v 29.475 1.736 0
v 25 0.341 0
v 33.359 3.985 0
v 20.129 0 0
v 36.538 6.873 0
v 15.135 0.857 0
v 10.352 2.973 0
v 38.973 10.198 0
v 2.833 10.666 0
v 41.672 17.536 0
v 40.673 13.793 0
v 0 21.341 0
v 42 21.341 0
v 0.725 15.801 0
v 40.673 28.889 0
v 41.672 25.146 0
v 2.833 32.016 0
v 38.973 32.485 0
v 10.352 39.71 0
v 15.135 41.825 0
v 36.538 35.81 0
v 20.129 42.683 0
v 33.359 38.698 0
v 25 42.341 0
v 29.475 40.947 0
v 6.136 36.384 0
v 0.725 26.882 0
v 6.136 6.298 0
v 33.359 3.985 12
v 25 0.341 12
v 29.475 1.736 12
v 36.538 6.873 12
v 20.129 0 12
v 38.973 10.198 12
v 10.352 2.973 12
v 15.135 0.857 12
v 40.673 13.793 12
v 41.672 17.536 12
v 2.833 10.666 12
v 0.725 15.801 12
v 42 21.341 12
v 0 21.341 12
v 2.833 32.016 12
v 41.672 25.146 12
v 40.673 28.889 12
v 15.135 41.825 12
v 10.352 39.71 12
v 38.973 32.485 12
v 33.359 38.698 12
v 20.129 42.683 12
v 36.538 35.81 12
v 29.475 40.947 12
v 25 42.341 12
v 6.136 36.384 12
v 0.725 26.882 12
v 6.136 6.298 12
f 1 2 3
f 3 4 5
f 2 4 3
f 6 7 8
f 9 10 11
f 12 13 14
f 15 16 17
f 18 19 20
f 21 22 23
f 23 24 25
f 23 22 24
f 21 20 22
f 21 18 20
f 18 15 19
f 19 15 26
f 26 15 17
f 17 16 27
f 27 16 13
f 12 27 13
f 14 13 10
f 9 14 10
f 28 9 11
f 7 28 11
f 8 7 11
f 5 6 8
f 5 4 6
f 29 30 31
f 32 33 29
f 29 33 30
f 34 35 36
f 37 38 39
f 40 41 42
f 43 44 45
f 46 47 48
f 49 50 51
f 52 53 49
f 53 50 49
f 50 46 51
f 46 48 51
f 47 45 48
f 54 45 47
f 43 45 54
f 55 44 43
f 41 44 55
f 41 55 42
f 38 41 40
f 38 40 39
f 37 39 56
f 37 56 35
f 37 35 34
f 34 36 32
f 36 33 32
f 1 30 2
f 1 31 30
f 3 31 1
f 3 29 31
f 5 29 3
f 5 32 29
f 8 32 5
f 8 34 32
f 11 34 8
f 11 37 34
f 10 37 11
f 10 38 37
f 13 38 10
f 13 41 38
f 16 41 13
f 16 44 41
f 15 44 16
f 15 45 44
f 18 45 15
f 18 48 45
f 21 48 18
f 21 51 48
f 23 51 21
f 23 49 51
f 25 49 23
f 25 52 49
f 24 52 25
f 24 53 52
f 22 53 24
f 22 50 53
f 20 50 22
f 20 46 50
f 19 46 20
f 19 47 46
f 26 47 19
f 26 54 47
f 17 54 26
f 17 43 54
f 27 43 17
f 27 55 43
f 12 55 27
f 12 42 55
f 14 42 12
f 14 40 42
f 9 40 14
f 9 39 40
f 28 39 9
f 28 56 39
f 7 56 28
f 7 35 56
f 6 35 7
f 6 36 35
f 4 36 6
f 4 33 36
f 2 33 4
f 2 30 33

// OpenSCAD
$fn = 32;

// ----------------------------------------------------------------------
// Cam disc: base radius 17.0 mm, lift 8.0 mm, 28 profile points
// ----------------------------------------------------------------------

// --- parameters (mm) ---
profile_height = 12;      // extrusion height
profile_points = 28;      // points of the closed outline

profile = [[42, 21.341], [41.672, 25.146], [40.673, 28.889], [38.973, 32.485], [36.538, 35.81], [33.359, 38.698], [29.475, 40.947], [25, 42.341], [20.129, 42.683], [15.135, 41.825], [10.352, 39.71], [6.136, 36.384], [2.833, 32.016], [0.725, 26.882], [0, 21.341], [0.725, 15.801], [2.833, 10.666], [6.136, 6.298], [10.352, 2.973], [15.135, 0.857], [20.129, 0], [25, 0.341], [29.475, 1.736], [33.359, 3.985], [36.538, 6.873], [38.973, 10.198], [40.673, 13.793], [41.672, 17.536]];  // single closed polygon, 28 points, counter clockwise

// --- the one profile operation ---
linear_extrude(height = profile_height) polygon(points = profile);
